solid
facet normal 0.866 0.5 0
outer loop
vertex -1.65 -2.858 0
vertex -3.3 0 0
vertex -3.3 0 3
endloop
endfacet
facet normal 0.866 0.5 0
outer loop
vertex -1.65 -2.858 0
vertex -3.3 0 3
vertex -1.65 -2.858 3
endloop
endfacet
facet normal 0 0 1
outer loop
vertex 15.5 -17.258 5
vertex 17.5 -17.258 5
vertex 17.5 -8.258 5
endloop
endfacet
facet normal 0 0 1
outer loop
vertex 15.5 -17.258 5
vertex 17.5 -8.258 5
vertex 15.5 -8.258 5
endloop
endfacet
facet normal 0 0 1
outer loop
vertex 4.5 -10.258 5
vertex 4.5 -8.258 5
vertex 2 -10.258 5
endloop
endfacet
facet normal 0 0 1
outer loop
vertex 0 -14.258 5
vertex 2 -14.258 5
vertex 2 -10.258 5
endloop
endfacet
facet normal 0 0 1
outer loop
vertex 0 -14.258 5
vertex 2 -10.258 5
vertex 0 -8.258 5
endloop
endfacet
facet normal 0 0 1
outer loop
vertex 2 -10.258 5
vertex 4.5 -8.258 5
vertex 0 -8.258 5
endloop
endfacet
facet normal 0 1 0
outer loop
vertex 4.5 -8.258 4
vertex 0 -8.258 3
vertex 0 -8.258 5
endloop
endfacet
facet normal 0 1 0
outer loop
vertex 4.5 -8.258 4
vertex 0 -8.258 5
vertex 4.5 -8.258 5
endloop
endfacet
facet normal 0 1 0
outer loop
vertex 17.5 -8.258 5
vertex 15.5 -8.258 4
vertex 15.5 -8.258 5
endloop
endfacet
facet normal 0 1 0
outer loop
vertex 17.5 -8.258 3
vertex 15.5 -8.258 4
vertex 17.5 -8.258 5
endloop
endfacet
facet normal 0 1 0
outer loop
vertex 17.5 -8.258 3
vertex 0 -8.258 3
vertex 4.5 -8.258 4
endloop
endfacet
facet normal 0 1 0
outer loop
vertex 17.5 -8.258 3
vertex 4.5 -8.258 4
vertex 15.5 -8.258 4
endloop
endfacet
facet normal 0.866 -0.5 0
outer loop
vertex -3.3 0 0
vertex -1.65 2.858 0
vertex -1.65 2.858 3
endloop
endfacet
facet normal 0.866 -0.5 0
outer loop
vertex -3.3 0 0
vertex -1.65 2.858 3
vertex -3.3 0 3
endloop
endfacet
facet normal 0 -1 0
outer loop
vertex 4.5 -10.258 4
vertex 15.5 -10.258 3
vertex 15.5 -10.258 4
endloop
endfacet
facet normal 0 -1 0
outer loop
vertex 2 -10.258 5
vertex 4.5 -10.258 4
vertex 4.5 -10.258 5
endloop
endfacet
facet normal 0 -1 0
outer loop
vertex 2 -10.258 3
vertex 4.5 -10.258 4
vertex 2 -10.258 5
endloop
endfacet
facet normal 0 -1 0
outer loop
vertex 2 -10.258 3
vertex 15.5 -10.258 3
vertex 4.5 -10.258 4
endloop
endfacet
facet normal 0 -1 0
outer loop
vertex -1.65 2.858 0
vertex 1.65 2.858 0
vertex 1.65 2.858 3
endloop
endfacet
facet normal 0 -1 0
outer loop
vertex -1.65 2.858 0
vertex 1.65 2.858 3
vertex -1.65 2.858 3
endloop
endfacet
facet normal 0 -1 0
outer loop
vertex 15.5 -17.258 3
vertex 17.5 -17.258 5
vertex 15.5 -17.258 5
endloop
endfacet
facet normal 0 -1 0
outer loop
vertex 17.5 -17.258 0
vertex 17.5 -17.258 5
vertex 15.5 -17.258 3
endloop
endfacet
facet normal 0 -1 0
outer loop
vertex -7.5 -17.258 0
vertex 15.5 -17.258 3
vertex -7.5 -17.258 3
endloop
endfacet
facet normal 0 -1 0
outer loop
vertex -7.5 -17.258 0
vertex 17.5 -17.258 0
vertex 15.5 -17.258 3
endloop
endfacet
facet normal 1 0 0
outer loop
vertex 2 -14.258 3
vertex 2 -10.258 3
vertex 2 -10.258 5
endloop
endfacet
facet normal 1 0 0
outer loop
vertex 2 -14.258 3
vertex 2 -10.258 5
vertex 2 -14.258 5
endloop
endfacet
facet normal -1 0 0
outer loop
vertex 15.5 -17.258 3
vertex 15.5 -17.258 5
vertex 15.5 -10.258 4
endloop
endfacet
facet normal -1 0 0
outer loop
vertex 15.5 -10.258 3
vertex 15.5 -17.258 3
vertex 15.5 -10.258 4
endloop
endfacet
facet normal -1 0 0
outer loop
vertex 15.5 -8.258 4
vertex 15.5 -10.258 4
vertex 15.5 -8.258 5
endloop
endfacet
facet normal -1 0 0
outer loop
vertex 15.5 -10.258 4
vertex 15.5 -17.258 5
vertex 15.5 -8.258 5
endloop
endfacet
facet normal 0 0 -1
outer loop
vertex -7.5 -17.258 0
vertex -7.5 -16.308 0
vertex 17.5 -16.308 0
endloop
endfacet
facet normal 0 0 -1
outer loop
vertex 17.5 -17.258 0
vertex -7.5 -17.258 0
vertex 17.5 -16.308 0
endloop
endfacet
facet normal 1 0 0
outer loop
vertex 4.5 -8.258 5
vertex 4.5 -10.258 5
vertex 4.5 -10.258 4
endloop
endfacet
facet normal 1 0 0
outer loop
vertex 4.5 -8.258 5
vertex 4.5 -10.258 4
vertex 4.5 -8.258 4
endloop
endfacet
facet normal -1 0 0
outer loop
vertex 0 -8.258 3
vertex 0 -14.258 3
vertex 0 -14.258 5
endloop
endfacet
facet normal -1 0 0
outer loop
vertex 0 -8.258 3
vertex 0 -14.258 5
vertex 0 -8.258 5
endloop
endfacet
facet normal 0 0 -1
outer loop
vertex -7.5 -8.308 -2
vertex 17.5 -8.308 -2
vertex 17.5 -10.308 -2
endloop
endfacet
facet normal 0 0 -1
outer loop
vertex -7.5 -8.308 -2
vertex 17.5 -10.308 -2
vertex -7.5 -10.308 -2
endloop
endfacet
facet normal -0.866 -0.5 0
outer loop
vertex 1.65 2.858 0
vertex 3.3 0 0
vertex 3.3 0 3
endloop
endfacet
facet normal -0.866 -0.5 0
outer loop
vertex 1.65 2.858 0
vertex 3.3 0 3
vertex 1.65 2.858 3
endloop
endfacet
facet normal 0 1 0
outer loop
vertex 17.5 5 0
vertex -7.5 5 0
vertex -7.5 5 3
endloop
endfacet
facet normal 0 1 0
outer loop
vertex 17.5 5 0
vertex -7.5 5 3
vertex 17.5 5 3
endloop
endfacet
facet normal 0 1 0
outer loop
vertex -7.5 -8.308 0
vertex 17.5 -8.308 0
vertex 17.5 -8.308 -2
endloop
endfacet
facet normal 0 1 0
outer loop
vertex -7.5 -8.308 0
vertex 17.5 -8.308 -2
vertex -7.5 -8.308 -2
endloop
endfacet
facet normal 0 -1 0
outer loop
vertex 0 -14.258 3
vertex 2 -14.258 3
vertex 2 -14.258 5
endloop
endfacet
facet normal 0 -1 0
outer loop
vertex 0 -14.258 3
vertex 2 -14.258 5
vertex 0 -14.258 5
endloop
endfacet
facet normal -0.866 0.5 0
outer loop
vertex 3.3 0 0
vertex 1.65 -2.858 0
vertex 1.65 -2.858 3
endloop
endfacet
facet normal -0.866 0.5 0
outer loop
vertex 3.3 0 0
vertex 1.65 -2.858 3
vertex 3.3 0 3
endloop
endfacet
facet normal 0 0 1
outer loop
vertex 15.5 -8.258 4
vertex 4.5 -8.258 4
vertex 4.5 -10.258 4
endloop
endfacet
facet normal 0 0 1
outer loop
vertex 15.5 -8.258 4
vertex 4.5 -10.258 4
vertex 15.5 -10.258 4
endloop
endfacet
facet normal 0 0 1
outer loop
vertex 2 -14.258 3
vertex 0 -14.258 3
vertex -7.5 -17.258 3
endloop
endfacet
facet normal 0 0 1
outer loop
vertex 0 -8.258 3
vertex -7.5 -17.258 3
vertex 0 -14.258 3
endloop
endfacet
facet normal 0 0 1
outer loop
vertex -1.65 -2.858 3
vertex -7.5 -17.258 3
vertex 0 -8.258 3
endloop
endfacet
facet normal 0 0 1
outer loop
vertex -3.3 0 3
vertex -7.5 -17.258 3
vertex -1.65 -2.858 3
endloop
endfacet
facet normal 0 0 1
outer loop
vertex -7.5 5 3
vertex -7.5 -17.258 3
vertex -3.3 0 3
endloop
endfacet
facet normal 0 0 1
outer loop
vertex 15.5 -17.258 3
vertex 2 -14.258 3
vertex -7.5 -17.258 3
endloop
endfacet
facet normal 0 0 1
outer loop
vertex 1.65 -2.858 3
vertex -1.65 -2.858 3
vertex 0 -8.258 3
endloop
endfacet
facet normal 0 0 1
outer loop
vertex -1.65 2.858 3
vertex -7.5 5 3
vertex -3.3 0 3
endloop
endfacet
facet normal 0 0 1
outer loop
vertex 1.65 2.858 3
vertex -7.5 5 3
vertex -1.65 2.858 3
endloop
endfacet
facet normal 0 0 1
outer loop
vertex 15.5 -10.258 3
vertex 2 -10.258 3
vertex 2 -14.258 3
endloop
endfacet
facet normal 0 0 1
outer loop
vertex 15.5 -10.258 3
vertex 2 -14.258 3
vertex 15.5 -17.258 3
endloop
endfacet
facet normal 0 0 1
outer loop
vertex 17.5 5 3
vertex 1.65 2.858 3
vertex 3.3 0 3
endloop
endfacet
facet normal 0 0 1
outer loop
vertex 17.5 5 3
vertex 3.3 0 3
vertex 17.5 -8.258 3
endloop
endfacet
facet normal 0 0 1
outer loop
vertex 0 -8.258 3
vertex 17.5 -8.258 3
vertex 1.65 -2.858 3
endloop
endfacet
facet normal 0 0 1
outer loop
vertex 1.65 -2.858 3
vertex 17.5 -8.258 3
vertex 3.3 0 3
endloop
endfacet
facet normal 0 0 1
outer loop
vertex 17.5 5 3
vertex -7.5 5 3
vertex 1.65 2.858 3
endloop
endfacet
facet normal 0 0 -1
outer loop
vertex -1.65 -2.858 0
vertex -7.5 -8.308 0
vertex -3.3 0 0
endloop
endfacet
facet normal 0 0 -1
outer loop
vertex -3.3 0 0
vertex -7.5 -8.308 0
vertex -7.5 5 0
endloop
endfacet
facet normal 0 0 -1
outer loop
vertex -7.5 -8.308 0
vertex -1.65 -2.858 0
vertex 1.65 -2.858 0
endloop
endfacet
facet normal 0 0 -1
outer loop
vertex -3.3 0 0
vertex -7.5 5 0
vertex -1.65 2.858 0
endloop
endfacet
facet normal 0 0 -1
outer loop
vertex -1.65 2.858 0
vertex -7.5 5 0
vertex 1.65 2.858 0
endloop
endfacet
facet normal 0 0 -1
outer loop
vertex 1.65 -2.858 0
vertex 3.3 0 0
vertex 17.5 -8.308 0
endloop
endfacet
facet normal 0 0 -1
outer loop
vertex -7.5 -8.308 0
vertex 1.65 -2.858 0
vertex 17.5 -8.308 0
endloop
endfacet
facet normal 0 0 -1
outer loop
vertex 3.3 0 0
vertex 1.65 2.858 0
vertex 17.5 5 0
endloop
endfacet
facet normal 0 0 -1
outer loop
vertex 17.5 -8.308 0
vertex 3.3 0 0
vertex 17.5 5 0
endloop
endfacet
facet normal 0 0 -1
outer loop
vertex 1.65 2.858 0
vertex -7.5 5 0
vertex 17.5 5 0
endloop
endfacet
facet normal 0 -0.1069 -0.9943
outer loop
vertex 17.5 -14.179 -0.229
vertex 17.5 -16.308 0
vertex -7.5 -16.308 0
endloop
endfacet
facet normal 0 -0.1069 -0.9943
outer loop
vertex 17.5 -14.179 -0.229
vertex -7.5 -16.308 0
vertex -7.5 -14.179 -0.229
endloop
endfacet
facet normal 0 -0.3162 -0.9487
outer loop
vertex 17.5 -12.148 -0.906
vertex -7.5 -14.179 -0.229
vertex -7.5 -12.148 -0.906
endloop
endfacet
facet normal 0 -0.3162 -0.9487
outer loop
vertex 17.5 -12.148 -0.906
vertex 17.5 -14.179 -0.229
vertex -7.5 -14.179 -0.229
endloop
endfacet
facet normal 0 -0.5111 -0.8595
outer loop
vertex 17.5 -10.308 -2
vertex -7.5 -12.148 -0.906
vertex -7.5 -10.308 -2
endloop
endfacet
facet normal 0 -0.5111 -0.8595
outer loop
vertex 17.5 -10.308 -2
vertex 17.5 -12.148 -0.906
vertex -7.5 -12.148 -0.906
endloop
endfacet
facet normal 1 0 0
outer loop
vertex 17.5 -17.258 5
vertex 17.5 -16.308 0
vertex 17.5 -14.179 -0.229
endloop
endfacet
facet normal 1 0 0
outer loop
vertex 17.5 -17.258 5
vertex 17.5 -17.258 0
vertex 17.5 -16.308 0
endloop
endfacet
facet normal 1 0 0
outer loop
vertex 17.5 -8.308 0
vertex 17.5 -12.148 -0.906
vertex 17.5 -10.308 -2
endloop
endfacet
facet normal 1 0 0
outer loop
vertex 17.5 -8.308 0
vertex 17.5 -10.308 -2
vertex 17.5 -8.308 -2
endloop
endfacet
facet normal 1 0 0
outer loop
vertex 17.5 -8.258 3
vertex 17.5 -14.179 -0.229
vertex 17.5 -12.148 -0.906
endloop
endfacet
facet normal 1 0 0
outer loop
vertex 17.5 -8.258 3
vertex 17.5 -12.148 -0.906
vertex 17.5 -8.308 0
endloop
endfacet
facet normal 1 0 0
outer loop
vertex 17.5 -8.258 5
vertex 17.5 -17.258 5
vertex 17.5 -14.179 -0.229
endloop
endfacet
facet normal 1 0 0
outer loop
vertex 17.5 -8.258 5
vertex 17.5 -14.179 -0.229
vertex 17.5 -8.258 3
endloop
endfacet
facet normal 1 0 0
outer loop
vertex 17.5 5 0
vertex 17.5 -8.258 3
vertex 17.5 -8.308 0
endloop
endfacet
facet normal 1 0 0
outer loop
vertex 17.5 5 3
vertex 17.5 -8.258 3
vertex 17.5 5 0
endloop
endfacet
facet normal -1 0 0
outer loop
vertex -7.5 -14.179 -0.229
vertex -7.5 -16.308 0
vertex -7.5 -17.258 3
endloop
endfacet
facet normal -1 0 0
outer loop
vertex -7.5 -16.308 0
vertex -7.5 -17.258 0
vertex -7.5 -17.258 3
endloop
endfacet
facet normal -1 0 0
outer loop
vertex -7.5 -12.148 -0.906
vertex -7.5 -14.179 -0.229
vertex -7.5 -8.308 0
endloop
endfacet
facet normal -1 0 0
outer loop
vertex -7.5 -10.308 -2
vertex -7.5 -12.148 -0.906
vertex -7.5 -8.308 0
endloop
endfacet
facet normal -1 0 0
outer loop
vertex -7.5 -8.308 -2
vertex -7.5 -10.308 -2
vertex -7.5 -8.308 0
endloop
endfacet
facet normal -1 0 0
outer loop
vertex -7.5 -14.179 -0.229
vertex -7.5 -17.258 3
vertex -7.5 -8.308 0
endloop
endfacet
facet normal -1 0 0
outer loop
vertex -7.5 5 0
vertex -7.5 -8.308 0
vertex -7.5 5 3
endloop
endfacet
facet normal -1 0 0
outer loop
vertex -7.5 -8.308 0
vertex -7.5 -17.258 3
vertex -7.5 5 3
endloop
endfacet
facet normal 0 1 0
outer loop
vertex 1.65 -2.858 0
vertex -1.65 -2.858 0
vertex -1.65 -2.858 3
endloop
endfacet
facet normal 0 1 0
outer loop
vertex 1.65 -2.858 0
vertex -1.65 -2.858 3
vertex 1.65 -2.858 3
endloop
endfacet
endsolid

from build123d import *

# Parameters (mm, degrees)
ESQUISSE1_W             = 25
ESQUISSE1_H             = 22.257883832
BOSS_EXTRU_1_DEPTH      = 3
ESQUISSE2_W             = 25
ESQUISSE2_H             = 2
BOSS_EXTRU_2_DEPTH      = 2
BOSS_EXTRU_3_DEPTH      = 2
ESQUISSE6_W             = 11
ESQUISSE6_H             = 2
ENL_V_MAT_EXTRU_2_DEPTH = 1
CONG_1_R                = 10


with BuildPart() as part:
    # Esquisse1 → Boss.-Extru.1 (new body)
    with BuildSketch(Plane.XY):
        with Locations((5, -6.128941916)):
            Rectangle(ESQUISSE1_W, ESQUISSE1_H)
        Polygon((1.65, -2.857883832), (3.3, 0), (1.65, 2.857883832), (-1.65, 2.857883832), (-3.3, 0), (-1.65, -2.857883832), align=None, mode=Mode.SUBTRACT)
    extrude(amount=BOSS_EXTRU_1_DEPTH)

    # Esquisse2 → Boss.-Extru.2 (add)
    with BuildSketch(Plane(origin=(0, 0, 0), x_dir=(-1, 0, 0), z_dir=(0, 0, -1))):
        with Locations((-5, -9.307883832)):
            Rectangle(ESQUISSE2_W, ESQUISSE2_H)
    extrude(amount=BOSS_EXTRU_2_DEPTH)

    # Esquisse3 → Boss.-Extru.3 (add)
    with BuildSketch(Plane.XY.offset(3)):
        Polygon((0, -8.257883832), (17.5, -8.257883832), (17.5, -17.257883832), (15.5, -17.257883832), (15.5, -10.257883832), (2, -10.257883832), (2, -14.257883832), (0, -14.257883832), align=None)
    extrude(amount=BOSS_EXTRU_3_DEPTH)

    # Esquisse6 → Enlèv. mat.-Extru.2 (cut)
    with BuildSketch(Plane.XY.offset(5)):
        with Locations((10, -9.257883832)):
            Rectangle(ESQUISSE6_W, ESQUISSE6_H)
    extrude(amount=-ENL_V_MAT_EXTRU_2_DEPTH, mode=Mode.SUBTRACT)

    # Congé1
    # the kernel refuses this fillet: 10 mm, written as the material it adds along each edge
    with BuildSketch(Plane(origin=(17.5, -10.307883832, 0), x_dir=(0, -1, 0), z_dir=(-1, 0, 0))) as cong_1_piece_1:
        with BuildLine():
            CenterArc((6, -10), CONG_1_R, 90, 36.869897646)
            Line((0, -2), (0, 0))
            Line((0, 0), (6, 0))
        make_face()
    extrude(amount=25)


solid = part.part
